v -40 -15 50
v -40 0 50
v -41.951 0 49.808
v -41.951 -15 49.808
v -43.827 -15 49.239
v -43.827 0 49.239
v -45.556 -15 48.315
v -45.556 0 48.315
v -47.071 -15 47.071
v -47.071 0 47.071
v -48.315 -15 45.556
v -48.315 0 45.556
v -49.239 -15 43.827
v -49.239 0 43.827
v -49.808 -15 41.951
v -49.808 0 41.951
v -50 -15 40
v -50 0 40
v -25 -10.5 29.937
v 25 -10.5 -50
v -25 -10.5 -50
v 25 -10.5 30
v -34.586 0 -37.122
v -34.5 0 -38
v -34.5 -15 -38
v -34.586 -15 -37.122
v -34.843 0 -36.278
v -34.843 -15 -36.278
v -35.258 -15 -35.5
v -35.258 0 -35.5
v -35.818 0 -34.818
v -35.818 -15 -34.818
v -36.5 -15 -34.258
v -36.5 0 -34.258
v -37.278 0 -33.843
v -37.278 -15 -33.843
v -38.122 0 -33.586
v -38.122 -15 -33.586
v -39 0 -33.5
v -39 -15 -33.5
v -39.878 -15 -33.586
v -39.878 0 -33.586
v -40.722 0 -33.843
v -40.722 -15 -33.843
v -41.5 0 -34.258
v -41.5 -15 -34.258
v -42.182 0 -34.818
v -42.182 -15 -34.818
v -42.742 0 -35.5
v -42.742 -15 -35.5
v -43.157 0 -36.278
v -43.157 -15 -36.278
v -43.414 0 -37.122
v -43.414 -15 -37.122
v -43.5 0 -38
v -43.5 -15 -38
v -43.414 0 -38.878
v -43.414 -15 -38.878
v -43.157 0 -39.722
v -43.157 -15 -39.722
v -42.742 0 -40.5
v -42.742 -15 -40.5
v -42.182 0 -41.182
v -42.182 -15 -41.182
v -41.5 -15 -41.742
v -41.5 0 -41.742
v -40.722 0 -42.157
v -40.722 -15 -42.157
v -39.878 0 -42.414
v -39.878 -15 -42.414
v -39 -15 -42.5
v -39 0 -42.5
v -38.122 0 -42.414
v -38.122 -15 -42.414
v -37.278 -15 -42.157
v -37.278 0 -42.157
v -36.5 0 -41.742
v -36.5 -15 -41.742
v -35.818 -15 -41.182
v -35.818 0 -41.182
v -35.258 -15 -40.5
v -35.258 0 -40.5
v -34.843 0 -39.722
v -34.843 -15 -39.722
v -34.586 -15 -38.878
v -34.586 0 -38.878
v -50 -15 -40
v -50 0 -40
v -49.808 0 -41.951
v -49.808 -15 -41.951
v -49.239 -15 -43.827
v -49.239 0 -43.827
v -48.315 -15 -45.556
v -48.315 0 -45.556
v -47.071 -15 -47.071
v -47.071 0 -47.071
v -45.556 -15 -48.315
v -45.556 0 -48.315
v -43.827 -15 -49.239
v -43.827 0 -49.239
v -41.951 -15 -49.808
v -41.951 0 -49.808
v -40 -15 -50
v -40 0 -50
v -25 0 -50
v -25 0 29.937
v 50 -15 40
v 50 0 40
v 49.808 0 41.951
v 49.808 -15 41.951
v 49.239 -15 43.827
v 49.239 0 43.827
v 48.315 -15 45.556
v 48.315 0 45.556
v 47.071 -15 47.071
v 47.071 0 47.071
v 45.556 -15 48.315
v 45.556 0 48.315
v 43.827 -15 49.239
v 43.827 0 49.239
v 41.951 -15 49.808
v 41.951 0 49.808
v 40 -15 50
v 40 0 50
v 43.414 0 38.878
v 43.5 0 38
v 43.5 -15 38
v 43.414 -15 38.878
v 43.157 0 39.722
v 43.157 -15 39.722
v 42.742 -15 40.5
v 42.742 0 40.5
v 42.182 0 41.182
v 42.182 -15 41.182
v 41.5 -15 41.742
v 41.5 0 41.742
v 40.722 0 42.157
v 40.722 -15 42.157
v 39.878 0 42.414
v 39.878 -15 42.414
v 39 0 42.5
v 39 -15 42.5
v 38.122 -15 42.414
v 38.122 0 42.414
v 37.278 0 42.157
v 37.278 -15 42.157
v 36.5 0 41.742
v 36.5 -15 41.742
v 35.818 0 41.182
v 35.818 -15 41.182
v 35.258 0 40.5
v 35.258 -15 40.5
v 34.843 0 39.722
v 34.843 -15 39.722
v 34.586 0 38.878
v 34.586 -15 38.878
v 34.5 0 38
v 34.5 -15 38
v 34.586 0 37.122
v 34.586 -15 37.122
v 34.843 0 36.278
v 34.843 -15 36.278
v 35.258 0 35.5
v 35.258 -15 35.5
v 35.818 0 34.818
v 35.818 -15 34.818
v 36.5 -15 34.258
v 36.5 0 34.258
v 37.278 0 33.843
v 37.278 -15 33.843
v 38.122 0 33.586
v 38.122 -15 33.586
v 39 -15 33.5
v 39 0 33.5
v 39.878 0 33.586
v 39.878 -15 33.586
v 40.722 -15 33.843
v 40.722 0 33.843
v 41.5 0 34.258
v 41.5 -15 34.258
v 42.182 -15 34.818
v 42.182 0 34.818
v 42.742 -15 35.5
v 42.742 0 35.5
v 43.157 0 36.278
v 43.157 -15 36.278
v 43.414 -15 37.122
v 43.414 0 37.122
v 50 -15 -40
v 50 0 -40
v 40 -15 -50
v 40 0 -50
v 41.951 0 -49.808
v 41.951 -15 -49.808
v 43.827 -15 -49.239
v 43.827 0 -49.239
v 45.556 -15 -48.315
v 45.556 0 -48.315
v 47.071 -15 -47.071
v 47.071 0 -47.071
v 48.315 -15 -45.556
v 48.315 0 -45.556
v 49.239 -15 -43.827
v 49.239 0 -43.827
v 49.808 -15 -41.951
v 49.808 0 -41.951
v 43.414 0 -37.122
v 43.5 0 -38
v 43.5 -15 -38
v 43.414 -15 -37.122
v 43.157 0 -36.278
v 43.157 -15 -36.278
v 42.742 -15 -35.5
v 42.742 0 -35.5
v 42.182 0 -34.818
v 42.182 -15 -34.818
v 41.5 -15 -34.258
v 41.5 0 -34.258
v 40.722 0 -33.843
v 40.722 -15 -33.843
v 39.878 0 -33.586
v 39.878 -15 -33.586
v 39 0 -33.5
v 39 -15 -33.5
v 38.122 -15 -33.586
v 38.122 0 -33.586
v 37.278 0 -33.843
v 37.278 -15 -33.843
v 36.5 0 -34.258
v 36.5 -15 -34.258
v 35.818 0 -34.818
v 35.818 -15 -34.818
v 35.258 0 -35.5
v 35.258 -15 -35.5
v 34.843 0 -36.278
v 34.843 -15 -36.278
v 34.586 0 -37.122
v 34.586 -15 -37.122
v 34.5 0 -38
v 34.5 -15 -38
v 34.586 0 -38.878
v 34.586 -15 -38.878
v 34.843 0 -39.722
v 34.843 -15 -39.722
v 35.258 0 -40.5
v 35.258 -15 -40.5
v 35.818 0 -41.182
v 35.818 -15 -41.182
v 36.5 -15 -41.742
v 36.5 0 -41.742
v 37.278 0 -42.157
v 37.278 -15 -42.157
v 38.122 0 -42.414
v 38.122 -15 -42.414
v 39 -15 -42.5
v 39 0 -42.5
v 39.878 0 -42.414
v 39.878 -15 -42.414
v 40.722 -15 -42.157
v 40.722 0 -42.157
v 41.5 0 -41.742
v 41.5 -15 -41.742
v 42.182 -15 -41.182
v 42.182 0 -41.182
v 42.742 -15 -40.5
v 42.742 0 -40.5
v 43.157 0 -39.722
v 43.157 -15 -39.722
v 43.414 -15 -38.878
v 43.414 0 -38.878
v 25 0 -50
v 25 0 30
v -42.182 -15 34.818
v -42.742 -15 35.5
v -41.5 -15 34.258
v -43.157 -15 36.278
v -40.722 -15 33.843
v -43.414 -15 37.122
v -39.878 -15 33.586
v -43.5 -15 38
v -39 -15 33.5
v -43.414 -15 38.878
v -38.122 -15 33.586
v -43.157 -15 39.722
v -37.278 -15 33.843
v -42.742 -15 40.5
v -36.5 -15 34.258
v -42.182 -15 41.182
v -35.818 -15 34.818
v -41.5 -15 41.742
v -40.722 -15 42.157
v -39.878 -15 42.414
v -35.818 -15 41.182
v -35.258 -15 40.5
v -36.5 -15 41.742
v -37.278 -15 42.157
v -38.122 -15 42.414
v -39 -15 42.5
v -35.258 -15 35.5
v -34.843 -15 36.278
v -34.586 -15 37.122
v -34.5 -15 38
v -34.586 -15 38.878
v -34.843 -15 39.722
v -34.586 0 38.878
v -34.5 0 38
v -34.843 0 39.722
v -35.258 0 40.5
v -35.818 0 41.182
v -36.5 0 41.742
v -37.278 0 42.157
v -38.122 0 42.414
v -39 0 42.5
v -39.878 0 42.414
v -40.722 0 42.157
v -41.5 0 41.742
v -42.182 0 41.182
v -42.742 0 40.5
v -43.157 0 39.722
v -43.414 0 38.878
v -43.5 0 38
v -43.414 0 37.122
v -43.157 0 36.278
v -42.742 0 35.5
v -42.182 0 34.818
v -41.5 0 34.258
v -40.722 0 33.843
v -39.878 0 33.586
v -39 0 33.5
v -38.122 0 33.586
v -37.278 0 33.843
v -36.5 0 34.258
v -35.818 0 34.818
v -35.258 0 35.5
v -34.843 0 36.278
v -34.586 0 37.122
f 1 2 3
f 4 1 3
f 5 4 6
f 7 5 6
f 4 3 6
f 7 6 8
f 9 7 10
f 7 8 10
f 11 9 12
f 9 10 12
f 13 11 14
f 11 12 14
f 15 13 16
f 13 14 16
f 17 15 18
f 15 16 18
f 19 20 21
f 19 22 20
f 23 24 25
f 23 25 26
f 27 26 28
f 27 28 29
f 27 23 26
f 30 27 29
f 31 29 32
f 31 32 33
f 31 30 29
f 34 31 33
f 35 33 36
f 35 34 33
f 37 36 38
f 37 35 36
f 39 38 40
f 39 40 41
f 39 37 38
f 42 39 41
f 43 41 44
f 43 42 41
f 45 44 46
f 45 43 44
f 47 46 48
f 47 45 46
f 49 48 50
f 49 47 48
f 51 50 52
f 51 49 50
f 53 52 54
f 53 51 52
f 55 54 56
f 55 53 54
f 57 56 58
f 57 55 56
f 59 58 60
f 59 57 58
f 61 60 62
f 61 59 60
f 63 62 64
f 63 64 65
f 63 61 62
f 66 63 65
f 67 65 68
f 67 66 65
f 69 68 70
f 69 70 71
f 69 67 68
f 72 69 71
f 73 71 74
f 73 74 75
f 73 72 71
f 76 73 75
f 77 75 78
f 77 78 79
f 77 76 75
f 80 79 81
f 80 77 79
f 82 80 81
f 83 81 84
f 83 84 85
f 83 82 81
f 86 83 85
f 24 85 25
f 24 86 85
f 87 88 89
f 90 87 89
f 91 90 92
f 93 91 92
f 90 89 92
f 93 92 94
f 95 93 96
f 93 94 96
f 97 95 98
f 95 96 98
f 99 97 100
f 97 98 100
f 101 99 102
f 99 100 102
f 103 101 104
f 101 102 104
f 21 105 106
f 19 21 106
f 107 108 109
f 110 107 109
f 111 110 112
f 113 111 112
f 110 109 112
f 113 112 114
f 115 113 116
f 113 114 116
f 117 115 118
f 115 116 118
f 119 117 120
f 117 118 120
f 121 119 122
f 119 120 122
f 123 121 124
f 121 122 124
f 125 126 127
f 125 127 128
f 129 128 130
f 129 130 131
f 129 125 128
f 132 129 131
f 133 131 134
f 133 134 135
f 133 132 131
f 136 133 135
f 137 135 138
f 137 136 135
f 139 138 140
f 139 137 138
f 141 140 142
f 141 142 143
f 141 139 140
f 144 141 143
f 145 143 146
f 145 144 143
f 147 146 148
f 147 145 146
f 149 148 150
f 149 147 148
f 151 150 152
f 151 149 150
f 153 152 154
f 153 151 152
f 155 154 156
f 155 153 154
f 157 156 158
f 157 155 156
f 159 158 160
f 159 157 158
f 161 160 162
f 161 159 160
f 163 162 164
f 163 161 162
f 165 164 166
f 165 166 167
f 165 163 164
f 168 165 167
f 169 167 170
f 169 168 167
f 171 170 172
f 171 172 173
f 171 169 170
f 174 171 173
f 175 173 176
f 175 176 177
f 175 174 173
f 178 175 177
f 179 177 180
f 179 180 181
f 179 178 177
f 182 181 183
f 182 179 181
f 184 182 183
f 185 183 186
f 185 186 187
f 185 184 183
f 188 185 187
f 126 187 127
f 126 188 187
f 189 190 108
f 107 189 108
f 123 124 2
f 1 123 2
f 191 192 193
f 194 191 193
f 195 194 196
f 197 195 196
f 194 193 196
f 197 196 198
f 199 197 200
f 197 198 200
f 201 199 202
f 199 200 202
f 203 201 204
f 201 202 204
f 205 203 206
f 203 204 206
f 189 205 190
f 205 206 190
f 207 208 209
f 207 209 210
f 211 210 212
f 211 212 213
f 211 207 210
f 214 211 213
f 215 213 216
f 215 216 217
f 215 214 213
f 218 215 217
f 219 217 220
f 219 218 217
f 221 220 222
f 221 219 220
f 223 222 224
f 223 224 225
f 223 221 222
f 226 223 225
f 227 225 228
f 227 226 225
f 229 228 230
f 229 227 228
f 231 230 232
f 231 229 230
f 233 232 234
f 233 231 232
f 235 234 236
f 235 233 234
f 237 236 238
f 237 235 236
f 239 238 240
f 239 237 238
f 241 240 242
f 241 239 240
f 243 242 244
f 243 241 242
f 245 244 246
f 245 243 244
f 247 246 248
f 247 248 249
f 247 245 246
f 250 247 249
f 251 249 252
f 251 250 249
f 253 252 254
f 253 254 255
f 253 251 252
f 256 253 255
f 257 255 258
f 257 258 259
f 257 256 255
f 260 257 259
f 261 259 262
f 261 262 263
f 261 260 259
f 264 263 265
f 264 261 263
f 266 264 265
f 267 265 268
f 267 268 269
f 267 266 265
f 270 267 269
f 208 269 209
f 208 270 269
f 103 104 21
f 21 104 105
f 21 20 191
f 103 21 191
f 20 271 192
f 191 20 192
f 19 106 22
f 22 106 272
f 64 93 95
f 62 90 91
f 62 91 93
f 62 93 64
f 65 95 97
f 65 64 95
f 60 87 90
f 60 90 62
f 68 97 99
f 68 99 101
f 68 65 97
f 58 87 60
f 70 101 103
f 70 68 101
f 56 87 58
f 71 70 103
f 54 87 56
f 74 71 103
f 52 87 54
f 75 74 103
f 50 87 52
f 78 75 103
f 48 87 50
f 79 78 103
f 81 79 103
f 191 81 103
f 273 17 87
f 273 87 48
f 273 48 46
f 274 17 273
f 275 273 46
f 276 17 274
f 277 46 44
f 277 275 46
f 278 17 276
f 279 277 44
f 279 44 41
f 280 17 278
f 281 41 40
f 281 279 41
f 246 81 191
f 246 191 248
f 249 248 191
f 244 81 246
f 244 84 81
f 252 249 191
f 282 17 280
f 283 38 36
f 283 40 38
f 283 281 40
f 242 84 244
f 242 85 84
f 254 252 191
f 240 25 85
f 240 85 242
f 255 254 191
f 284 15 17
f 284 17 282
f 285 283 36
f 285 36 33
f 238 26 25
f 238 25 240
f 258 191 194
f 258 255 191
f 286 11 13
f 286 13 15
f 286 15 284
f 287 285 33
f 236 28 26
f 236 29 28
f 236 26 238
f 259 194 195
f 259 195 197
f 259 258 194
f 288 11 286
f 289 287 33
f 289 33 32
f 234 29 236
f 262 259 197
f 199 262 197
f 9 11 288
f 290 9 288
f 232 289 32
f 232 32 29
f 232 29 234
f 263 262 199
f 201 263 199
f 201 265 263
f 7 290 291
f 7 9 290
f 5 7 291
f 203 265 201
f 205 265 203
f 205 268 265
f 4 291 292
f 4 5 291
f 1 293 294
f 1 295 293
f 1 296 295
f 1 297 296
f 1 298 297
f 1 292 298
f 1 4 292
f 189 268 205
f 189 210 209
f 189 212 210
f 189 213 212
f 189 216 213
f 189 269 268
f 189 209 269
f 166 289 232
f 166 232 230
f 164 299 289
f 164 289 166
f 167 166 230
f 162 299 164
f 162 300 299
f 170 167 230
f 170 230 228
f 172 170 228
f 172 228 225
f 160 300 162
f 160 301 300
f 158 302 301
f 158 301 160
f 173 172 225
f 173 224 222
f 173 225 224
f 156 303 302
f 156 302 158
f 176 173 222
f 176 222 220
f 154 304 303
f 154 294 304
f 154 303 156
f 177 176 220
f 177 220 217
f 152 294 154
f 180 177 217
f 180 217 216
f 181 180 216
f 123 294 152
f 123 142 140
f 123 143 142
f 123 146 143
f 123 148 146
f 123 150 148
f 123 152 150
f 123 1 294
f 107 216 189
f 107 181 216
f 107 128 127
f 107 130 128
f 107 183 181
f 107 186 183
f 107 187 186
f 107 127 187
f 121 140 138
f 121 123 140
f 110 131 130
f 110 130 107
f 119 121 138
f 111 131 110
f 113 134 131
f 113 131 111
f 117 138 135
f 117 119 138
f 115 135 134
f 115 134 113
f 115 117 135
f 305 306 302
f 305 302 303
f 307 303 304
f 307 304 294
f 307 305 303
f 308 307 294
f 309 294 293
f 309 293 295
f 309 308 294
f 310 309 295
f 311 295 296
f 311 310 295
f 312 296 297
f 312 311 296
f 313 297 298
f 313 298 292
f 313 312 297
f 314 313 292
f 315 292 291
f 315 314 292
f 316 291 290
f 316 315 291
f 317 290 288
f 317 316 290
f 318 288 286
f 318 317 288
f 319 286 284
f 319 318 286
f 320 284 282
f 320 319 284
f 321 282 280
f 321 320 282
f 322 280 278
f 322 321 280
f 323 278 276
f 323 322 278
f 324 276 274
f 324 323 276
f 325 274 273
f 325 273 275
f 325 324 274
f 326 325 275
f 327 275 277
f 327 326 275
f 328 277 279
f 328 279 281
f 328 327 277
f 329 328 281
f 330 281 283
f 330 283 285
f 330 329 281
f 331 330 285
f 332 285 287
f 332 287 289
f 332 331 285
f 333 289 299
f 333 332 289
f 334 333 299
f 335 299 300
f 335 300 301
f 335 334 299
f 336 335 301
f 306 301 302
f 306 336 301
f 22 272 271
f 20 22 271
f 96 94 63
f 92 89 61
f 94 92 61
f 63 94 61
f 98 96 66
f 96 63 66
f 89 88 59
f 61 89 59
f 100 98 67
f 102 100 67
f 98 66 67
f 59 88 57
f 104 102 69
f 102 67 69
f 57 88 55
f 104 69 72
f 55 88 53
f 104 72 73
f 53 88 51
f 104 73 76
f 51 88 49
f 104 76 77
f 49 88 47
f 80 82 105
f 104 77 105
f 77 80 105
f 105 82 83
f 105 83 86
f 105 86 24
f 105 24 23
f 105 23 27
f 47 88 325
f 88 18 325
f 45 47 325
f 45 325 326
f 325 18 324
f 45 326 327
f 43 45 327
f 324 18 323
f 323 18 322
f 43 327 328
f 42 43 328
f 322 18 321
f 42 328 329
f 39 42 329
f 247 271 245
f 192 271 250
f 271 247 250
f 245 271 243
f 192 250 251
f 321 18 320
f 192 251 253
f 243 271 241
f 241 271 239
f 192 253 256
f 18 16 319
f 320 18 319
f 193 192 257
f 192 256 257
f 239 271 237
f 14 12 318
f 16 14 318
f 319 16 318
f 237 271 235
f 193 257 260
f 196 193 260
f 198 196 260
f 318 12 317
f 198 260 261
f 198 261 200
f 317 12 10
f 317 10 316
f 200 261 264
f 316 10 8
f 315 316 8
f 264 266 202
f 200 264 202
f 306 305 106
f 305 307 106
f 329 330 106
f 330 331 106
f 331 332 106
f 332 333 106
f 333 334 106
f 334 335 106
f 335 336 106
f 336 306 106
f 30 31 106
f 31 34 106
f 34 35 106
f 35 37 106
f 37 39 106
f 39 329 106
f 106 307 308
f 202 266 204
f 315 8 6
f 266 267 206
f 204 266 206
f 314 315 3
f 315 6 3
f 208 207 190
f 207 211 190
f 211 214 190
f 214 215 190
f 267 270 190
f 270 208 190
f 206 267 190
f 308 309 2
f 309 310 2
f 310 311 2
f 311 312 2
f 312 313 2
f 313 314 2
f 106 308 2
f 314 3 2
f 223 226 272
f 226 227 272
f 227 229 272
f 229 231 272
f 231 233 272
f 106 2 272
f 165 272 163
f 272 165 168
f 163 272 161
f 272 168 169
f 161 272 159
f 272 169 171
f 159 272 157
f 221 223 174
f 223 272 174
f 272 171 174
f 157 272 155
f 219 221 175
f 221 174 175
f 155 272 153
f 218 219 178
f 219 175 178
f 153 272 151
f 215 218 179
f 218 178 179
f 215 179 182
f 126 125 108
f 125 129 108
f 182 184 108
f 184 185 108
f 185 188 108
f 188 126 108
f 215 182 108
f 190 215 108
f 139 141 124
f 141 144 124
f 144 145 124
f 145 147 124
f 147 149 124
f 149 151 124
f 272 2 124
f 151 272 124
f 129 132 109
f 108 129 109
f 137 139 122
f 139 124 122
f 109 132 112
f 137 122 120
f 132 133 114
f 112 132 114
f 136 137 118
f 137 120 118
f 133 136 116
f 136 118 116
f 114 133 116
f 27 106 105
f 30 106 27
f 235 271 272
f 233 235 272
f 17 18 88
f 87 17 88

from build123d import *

# Parameters (mm, degrees)
F0_R     = 4.5
F1_DEPTH = 15
F3_DEPTH = 10.5


with BuildPart() as f1:
    # F0 (on Front) → F1 (new body)
    with BuildSketch(Plane.XZ):
        with BuildLine():
            Line((40, 50), (-40, 50))
            ThreePointArc((-40, 50), (-47.071068, 47.071068), (-50, 40))
            Line((-50, 40), (-50, -40))
            ThreePointArc((-50, -40), (-47.071068, -47.071068), (-40, -50))
            Line((-40, -50), (40, -50))
            ThreePointArc((40, -50), (47.071068, -47.071068), (50, -40))
            Line((50, -40), (50, 40))
            ThreePointArc((50, 40), (47.071068, 47.071068), (40, 50))
        make_face()
        with Locations((-39, -38)):
            Circle(F0_R, mode=Mode.SUBTRACT)
        with Locations((39, -38)):
            Circle(F0_R, mode=Mode.SUBTRACT)
        with Locations((-39, 38)):
            Circle(F0_R, mode=Mode.SUBTRACT)
        with Locations((39, 38)):
            Circle(F0_R, mode=Mode.SUBTRACT)
    extrude(amount=F1_DEPTH)

    # F2 (on face) → F3 (cut)
    with BuildSketch(Plane(origin=(0, 0, 0), x_dir=(-1, 0, 0), z_dir=(0, 1, 0))):
        Polygon((-25, 14.751212), (-25, -50), (25, -50), (25, 29.937138), (-25, 30), align=None)
    extrude(amount=-F3_DEPTH, mode=Mode.SUBTRACT)


solid = f1.part
